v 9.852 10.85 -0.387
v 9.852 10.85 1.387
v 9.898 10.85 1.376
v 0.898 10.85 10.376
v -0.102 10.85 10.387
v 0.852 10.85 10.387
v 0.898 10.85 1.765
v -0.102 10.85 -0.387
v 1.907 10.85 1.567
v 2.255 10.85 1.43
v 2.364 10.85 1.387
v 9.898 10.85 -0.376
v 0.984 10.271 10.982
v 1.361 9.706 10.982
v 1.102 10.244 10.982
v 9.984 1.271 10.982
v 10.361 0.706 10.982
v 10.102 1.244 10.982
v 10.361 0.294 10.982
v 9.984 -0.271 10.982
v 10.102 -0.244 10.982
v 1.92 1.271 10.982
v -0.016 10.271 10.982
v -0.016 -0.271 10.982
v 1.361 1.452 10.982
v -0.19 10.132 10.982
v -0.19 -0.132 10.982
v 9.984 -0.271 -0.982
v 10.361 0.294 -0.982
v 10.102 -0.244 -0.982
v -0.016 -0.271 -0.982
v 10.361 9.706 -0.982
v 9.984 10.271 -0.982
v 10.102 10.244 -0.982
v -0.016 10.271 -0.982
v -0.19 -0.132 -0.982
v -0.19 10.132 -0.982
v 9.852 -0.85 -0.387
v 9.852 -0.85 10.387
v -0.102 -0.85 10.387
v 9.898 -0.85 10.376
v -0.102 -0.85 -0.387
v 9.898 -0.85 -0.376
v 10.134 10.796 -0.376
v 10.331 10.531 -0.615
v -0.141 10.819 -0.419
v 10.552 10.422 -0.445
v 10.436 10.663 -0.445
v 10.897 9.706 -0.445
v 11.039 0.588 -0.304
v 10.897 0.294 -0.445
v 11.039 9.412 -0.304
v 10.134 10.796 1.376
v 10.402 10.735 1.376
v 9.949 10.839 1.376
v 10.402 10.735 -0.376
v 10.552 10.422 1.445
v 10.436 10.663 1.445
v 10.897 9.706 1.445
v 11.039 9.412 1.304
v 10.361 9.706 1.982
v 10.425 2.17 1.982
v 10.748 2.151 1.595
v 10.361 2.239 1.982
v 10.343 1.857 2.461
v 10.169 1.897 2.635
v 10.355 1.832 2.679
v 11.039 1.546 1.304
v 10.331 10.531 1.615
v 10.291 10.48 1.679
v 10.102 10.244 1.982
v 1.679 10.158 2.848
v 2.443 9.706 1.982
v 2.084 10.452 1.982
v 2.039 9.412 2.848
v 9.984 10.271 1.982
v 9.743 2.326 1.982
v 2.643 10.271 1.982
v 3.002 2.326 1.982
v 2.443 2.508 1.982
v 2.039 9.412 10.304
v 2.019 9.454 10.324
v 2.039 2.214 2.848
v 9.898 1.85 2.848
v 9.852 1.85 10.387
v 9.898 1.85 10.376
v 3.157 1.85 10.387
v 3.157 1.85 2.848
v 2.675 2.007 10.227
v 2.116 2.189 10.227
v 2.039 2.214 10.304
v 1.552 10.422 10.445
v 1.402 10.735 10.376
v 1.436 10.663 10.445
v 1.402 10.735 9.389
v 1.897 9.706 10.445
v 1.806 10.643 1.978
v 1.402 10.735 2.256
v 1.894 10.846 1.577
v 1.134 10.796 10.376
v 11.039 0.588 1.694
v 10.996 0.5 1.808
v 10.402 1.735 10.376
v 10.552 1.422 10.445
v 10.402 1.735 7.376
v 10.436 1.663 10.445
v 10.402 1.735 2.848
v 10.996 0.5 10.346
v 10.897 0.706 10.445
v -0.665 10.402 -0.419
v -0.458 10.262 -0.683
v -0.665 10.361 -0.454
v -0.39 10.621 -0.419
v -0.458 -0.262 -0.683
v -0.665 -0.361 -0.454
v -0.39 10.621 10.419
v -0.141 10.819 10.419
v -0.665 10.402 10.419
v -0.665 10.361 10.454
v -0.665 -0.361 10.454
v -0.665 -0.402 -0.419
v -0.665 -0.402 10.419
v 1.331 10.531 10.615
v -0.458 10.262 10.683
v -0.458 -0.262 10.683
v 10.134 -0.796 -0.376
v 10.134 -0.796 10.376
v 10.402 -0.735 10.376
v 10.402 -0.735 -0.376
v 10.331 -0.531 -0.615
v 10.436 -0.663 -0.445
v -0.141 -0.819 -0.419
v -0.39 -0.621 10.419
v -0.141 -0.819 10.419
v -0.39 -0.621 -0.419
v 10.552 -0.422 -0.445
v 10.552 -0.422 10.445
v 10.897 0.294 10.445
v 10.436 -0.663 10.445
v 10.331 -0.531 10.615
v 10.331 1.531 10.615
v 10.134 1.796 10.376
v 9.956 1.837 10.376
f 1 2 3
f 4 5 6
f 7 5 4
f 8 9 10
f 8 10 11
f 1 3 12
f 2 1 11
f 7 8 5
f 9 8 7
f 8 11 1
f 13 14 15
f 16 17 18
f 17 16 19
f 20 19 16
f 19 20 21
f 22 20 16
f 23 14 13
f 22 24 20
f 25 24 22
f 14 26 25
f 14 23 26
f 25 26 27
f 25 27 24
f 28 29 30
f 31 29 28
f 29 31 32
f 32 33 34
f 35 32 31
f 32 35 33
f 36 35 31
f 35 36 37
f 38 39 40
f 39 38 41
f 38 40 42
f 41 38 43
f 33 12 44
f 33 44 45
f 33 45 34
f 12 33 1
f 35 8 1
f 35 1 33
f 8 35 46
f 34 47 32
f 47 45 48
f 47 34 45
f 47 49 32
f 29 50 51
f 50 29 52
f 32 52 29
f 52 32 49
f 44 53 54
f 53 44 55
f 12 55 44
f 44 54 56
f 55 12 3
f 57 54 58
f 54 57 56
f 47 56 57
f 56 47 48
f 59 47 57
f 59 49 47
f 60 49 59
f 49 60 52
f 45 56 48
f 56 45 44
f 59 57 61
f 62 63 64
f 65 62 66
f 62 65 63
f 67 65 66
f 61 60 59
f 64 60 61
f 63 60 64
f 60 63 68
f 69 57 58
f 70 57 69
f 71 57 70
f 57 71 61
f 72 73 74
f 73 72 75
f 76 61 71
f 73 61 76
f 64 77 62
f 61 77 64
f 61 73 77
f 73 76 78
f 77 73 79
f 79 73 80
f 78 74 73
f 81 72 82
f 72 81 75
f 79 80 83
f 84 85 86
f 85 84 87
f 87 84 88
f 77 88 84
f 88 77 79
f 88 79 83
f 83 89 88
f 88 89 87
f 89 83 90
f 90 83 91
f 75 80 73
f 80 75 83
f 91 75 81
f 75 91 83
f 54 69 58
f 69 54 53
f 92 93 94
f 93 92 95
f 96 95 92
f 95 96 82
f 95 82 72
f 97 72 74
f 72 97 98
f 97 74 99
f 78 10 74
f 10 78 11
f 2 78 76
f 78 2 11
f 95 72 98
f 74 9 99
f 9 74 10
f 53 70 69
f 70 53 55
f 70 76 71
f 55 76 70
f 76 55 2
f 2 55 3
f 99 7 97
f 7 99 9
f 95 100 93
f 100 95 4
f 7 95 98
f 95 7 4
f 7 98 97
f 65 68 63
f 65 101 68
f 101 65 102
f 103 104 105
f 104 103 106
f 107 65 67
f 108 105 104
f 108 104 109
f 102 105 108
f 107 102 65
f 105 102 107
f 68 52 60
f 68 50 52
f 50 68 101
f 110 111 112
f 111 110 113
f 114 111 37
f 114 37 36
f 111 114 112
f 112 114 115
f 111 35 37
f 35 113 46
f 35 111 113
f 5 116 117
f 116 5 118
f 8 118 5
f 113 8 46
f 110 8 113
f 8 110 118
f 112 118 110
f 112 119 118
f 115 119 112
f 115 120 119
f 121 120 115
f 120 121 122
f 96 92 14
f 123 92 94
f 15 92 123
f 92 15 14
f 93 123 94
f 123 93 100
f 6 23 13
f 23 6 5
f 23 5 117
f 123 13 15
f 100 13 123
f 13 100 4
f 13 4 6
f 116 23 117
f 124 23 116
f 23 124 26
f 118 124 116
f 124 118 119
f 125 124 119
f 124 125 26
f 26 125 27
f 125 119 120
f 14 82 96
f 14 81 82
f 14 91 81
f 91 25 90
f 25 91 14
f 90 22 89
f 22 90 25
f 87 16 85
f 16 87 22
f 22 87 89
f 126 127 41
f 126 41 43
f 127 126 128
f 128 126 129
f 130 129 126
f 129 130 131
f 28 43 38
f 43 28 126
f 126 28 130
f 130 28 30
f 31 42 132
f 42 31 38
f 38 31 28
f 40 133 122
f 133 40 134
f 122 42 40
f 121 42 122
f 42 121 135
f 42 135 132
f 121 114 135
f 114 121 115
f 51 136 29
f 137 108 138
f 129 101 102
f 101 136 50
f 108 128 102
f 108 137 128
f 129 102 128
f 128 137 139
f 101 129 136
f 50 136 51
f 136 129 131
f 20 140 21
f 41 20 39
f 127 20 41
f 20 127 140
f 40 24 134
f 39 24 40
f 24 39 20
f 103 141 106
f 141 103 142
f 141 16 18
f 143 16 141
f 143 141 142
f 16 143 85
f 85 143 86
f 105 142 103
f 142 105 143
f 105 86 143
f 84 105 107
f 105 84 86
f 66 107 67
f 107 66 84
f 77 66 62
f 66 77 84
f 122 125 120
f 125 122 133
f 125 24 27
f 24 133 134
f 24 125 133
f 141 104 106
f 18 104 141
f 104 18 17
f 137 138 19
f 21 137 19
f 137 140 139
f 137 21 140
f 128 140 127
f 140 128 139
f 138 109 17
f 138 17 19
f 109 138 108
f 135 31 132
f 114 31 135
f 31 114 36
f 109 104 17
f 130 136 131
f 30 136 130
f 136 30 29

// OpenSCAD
    module base()difference (){
    cube(10);
    translate ([1,1,1])cube(10);
    }
    
    difference (){
    translate ([-4,-4,-4])
    cube(18);
    minkowski(){ 
    difference (){
    translate ([-5,-5,-5])
    cube(20);
    minkowski(){
    base();
    sphere(2,center=true); 
    }
    }  
    sphere(1,center=true); 
    }}
